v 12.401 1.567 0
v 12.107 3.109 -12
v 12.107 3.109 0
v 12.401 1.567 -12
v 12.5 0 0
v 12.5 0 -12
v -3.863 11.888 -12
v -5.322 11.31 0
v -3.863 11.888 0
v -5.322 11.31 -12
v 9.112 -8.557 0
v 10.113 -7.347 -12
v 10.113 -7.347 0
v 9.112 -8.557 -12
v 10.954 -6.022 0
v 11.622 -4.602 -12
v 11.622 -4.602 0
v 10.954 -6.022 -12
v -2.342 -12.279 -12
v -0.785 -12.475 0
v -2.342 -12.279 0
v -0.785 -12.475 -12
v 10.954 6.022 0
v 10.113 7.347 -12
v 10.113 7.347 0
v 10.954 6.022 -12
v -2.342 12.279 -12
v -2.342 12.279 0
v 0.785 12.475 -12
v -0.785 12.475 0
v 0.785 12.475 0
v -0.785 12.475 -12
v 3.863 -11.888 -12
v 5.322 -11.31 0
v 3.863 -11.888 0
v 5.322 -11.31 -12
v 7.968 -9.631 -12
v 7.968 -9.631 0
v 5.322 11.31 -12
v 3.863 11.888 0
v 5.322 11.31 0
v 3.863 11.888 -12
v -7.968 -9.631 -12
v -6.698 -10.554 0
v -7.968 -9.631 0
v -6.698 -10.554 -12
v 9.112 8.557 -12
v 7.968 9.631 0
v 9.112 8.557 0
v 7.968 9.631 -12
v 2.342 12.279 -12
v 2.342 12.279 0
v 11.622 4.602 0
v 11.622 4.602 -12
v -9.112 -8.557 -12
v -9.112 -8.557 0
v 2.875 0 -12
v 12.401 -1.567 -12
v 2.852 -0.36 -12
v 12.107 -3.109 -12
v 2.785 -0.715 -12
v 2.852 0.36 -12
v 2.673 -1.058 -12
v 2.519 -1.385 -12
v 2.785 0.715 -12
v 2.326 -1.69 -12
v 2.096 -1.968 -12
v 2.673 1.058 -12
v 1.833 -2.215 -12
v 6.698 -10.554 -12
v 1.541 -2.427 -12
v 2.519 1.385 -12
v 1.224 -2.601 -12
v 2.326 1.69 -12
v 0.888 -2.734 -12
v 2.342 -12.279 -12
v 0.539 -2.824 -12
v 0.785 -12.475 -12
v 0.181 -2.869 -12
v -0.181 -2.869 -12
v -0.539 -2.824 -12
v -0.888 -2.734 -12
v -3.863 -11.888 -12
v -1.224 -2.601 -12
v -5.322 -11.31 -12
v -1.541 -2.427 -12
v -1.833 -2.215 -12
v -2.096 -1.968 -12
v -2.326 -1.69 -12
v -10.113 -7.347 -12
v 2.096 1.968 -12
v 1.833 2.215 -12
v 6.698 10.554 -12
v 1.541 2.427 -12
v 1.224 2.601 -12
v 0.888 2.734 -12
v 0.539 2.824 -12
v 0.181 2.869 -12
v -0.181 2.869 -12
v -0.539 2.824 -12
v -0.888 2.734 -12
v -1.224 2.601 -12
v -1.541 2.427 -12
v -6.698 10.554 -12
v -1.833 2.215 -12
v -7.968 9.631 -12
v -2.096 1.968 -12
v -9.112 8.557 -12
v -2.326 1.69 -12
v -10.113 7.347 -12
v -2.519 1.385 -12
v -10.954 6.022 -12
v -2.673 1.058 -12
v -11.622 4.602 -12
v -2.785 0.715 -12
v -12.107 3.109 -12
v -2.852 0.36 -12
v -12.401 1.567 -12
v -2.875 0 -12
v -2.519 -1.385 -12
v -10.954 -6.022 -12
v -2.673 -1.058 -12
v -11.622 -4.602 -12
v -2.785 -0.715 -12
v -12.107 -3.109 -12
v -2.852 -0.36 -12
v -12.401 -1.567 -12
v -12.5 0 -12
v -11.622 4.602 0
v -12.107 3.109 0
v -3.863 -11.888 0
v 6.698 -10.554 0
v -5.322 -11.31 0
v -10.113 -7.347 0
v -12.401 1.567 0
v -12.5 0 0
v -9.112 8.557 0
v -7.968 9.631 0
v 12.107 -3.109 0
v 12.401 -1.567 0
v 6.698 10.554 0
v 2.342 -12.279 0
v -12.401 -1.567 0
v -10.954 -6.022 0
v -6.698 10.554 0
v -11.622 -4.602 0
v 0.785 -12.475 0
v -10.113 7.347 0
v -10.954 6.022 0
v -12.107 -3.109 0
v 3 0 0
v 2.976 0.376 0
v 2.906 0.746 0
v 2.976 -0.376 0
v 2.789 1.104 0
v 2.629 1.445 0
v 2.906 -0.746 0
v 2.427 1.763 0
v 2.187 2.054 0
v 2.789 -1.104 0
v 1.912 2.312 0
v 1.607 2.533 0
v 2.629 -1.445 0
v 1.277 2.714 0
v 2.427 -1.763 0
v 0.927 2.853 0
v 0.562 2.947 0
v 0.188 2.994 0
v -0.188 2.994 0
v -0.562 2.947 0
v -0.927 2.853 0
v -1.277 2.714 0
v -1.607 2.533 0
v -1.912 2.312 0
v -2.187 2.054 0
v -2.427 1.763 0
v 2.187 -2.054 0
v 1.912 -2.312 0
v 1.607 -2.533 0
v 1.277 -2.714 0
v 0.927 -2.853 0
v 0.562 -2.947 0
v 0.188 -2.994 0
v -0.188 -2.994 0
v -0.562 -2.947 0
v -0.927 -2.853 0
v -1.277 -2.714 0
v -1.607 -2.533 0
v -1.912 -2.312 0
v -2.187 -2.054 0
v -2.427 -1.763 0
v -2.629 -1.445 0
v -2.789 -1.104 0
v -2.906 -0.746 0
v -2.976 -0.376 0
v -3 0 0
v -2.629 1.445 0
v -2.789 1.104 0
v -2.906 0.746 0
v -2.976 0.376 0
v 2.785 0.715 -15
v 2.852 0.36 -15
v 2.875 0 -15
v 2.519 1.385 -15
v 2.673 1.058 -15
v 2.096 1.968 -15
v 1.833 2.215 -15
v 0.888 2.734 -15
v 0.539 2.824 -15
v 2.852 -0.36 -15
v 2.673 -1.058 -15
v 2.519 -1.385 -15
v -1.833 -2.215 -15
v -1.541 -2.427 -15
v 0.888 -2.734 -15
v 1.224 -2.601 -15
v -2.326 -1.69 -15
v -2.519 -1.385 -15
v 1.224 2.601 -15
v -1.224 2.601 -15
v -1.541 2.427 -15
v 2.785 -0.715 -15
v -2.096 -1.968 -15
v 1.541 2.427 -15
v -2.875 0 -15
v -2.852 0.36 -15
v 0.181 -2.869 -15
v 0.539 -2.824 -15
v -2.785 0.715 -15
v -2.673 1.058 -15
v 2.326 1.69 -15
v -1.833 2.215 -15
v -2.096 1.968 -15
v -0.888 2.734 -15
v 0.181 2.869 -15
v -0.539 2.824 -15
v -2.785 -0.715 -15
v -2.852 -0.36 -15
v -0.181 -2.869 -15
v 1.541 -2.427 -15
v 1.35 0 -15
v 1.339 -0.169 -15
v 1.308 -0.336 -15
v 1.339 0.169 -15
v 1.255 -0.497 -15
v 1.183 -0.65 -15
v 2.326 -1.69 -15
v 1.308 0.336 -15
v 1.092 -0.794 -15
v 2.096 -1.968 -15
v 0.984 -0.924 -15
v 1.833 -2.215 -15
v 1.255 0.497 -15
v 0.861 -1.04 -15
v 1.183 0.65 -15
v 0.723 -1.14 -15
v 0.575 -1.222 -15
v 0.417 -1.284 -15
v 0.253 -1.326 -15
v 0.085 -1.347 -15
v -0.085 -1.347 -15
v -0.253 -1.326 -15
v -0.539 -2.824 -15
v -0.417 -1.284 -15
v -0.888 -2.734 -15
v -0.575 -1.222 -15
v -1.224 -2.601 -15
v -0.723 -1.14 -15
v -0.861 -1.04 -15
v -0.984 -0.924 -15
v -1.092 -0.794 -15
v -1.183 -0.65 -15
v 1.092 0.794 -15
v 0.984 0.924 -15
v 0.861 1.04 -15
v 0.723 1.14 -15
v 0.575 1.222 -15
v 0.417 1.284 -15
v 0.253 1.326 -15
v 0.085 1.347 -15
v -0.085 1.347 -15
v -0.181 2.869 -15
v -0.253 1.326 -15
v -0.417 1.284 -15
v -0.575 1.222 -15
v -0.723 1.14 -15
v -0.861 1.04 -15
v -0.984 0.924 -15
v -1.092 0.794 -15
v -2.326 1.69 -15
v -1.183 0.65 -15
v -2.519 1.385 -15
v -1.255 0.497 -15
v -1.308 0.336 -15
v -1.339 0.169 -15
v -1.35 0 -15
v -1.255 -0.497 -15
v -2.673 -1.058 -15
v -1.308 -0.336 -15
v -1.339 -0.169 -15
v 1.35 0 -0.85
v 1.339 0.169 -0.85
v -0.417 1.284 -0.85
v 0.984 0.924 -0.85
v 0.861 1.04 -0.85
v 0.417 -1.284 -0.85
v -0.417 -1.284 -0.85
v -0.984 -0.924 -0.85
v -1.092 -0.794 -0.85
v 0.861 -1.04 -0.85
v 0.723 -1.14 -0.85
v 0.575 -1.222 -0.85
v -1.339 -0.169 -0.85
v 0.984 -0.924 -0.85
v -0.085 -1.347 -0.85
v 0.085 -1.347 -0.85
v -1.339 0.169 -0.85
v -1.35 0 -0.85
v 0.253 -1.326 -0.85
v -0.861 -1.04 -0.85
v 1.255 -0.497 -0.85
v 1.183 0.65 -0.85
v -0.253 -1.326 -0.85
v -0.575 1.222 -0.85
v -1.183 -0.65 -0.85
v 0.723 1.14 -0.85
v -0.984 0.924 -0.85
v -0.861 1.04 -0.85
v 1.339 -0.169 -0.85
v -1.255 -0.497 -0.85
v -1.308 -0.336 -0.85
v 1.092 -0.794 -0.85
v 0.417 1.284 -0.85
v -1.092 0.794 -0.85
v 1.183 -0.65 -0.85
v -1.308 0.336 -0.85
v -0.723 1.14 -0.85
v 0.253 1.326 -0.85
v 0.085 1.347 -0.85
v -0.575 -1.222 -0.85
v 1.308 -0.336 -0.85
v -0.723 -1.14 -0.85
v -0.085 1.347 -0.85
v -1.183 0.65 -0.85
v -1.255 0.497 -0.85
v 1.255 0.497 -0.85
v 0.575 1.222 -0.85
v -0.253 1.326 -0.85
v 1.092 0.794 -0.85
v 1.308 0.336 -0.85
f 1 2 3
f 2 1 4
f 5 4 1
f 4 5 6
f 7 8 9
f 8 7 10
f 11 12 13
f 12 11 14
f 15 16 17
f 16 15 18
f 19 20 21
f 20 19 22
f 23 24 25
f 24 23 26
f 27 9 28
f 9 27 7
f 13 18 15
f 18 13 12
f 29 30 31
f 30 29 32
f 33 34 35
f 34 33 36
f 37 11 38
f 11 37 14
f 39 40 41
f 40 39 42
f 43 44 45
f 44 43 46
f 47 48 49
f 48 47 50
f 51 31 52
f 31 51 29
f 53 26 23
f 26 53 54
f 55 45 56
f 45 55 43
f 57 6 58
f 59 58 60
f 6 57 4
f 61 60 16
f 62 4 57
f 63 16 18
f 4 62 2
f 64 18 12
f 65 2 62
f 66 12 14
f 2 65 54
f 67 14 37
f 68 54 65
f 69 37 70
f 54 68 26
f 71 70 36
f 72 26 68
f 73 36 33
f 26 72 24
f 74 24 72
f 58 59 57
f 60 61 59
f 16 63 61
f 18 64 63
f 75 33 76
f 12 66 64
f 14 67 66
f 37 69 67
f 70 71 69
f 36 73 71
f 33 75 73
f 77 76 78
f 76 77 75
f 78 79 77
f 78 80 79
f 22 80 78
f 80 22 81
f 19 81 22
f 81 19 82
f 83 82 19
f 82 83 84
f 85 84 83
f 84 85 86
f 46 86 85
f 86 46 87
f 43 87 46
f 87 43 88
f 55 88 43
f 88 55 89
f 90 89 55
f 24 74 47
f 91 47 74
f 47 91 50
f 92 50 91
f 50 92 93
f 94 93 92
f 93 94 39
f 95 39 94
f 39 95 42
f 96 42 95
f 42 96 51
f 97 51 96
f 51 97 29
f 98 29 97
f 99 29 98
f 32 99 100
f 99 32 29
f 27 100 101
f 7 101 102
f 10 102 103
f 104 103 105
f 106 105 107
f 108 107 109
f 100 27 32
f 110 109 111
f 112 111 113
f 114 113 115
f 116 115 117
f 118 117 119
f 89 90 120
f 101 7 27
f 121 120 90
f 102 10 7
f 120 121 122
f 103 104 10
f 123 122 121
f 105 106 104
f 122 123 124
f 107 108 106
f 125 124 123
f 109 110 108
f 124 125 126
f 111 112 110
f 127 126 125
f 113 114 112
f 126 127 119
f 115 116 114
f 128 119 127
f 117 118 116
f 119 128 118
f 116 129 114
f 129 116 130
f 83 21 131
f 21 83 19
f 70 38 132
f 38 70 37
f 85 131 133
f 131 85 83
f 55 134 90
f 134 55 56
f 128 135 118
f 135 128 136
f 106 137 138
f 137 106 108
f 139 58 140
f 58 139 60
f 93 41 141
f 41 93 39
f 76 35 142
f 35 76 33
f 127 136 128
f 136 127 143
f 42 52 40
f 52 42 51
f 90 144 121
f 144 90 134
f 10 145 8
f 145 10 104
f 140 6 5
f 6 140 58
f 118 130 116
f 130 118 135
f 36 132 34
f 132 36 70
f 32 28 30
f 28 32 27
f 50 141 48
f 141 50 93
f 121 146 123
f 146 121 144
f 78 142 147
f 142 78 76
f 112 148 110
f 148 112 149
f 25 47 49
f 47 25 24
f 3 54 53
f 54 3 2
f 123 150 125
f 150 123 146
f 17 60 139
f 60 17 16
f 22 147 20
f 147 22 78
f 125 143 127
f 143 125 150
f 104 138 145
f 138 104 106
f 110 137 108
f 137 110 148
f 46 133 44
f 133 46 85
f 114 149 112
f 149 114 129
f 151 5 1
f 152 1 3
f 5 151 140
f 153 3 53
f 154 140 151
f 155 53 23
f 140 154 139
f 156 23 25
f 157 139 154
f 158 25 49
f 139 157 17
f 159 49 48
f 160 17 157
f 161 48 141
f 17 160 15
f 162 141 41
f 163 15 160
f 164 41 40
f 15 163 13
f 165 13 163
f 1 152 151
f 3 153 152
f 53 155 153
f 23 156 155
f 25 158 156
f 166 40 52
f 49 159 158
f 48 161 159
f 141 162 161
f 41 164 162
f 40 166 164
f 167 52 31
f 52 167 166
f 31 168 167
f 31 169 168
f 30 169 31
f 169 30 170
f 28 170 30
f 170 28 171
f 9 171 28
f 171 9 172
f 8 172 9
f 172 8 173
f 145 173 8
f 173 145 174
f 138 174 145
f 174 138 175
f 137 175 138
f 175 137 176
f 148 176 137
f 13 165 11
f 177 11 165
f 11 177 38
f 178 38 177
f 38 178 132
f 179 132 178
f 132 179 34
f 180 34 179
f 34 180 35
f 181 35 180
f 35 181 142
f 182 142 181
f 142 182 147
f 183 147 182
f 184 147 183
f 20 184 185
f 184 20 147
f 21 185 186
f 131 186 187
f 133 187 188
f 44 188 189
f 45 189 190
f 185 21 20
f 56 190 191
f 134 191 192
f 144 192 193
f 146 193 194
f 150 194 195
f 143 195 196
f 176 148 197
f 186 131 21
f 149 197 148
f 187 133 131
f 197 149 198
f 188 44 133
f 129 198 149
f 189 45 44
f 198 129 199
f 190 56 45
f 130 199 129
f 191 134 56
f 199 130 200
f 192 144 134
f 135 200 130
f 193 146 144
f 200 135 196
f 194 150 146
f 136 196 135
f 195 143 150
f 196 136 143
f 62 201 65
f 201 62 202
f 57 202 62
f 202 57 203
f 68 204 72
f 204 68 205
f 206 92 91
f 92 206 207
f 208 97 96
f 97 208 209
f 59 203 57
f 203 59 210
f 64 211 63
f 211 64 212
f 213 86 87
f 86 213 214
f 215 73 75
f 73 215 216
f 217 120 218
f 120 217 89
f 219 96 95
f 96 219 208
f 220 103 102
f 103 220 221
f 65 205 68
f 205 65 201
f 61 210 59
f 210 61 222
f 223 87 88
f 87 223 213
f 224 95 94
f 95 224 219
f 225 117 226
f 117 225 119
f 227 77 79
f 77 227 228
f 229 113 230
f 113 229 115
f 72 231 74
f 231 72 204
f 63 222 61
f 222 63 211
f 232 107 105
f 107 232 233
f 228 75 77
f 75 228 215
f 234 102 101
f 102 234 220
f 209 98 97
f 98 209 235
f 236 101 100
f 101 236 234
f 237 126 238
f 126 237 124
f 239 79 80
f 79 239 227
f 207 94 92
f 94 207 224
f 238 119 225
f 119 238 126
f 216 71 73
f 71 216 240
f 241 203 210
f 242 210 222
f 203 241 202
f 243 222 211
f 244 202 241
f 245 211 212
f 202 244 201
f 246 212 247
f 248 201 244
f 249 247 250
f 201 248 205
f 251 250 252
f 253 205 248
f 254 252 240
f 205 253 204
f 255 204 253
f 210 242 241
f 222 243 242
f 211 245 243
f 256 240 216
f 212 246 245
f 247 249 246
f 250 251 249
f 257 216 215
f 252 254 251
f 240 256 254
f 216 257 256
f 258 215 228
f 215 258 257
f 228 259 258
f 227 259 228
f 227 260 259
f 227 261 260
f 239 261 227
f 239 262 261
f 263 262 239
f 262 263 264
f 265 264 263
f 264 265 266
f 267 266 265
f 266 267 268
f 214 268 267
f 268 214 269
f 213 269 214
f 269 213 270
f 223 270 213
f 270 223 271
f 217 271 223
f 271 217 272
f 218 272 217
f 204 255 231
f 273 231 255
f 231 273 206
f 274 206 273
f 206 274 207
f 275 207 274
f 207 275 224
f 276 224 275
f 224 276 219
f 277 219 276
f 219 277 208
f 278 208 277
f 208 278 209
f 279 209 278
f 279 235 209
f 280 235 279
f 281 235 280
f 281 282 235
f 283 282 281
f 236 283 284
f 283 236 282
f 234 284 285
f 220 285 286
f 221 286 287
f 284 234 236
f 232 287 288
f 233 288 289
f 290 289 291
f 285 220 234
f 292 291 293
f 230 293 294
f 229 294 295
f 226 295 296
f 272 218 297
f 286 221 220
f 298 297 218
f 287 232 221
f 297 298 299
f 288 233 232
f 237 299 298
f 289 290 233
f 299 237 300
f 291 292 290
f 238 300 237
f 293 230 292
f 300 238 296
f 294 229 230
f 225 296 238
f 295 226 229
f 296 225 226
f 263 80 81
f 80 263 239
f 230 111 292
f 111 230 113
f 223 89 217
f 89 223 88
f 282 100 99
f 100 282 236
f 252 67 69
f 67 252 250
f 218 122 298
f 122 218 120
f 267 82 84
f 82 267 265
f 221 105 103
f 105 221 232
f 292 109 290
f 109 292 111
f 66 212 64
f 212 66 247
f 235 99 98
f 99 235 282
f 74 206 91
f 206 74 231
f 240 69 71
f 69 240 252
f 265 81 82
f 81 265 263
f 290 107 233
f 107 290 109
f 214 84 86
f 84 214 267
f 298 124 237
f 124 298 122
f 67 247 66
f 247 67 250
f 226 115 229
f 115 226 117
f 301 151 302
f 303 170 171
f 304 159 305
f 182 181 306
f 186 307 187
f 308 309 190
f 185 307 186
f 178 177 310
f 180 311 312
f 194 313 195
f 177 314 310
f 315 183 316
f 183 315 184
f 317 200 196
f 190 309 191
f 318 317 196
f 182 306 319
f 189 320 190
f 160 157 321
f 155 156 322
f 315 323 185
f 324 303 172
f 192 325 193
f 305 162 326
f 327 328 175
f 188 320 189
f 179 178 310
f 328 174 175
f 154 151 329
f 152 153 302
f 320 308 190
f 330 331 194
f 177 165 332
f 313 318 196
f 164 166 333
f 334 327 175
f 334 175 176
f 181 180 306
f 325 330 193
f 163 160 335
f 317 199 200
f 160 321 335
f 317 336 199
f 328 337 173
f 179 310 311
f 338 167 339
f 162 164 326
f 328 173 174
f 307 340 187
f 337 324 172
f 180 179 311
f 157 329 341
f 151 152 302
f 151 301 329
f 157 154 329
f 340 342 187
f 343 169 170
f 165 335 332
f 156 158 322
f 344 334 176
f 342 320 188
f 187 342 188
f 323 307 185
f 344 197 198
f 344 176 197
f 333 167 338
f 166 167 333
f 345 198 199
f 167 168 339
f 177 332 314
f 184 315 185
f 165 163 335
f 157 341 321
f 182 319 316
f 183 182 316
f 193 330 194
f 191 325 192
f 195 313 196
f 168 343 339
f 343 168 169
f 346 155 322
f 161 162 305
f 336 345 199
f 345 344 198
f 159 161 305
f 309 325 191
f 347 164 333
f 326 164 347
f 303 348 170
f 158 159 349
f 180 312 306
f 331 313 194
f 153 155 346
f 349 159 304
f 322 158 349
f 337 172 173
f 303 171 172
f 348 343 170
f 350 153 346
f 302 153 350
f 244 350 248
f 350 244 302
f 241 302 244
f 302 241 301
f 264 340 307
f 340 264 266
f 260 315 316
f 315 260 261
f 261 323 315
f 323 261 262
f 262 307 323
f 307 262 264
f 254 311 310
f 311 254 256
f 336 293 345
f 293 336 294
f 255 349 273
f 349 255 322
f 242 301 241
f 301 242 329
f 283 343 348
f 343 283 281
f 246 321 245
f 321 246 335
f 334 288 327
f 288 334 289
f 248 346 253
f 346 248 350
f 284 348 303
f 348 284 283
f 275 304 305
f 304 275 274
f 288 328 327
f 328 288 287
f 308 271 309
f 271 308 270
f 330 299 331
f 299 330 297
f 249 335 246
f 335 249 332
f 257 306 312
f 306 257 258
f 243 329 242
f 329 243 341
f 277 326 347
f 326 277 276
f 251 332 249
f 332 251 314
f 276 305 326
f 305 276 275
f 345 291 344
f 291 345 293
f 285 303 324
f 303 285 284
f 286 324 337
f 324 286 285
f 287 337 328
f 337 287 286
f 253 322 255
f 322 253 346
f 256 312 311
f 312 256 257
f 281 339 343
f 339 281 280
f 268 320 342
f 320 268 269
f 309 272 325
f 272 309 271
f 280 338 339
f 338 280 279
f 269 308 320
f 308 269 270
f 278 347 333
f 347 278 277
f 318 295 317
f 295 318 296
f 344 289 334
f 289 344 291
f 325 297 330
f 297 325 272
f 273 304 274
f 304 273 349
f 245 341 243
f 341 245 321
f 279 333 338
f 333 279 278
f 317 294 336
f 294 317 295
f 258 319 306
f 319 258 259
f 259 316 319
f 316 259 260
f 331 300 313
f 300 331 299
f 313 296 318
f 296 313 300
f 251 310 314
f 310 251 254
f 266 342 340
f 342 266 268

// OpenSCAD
$fn = 50;

difference() {
	union() {
		translate(v = [0, 0, -12.0]) {
			cylinder(h = 12, r = 12.5);
		}
		#translate(v = [0, 0, -15.0]) {
			cylinder(h = 15, r = 2.875);
		}
	}
	union() {
		translate(v = [0, 0, 0]) {
			rotate(a = [0, 0, 0]) {
				difference() {
					union() {
						translate(v = [0, 0, -15.0]) {
							cylinder(h = 15, r = 1.0);
						}
						translate(v = [0, 0, -0.85]) {
							cylinder(h = 0.85, r1 = 1.35, r2 = 3.0);
						}
						translate(v = [0, 0, -15.0]) {
							cylinder(h = 15, r = 1.35);
						}
						translate(v = [0, 0, -15.0]) {
							cylinder(h = 15, r = 1.0);
						}
					}
					union();
				}
			}
		}
	}
}
